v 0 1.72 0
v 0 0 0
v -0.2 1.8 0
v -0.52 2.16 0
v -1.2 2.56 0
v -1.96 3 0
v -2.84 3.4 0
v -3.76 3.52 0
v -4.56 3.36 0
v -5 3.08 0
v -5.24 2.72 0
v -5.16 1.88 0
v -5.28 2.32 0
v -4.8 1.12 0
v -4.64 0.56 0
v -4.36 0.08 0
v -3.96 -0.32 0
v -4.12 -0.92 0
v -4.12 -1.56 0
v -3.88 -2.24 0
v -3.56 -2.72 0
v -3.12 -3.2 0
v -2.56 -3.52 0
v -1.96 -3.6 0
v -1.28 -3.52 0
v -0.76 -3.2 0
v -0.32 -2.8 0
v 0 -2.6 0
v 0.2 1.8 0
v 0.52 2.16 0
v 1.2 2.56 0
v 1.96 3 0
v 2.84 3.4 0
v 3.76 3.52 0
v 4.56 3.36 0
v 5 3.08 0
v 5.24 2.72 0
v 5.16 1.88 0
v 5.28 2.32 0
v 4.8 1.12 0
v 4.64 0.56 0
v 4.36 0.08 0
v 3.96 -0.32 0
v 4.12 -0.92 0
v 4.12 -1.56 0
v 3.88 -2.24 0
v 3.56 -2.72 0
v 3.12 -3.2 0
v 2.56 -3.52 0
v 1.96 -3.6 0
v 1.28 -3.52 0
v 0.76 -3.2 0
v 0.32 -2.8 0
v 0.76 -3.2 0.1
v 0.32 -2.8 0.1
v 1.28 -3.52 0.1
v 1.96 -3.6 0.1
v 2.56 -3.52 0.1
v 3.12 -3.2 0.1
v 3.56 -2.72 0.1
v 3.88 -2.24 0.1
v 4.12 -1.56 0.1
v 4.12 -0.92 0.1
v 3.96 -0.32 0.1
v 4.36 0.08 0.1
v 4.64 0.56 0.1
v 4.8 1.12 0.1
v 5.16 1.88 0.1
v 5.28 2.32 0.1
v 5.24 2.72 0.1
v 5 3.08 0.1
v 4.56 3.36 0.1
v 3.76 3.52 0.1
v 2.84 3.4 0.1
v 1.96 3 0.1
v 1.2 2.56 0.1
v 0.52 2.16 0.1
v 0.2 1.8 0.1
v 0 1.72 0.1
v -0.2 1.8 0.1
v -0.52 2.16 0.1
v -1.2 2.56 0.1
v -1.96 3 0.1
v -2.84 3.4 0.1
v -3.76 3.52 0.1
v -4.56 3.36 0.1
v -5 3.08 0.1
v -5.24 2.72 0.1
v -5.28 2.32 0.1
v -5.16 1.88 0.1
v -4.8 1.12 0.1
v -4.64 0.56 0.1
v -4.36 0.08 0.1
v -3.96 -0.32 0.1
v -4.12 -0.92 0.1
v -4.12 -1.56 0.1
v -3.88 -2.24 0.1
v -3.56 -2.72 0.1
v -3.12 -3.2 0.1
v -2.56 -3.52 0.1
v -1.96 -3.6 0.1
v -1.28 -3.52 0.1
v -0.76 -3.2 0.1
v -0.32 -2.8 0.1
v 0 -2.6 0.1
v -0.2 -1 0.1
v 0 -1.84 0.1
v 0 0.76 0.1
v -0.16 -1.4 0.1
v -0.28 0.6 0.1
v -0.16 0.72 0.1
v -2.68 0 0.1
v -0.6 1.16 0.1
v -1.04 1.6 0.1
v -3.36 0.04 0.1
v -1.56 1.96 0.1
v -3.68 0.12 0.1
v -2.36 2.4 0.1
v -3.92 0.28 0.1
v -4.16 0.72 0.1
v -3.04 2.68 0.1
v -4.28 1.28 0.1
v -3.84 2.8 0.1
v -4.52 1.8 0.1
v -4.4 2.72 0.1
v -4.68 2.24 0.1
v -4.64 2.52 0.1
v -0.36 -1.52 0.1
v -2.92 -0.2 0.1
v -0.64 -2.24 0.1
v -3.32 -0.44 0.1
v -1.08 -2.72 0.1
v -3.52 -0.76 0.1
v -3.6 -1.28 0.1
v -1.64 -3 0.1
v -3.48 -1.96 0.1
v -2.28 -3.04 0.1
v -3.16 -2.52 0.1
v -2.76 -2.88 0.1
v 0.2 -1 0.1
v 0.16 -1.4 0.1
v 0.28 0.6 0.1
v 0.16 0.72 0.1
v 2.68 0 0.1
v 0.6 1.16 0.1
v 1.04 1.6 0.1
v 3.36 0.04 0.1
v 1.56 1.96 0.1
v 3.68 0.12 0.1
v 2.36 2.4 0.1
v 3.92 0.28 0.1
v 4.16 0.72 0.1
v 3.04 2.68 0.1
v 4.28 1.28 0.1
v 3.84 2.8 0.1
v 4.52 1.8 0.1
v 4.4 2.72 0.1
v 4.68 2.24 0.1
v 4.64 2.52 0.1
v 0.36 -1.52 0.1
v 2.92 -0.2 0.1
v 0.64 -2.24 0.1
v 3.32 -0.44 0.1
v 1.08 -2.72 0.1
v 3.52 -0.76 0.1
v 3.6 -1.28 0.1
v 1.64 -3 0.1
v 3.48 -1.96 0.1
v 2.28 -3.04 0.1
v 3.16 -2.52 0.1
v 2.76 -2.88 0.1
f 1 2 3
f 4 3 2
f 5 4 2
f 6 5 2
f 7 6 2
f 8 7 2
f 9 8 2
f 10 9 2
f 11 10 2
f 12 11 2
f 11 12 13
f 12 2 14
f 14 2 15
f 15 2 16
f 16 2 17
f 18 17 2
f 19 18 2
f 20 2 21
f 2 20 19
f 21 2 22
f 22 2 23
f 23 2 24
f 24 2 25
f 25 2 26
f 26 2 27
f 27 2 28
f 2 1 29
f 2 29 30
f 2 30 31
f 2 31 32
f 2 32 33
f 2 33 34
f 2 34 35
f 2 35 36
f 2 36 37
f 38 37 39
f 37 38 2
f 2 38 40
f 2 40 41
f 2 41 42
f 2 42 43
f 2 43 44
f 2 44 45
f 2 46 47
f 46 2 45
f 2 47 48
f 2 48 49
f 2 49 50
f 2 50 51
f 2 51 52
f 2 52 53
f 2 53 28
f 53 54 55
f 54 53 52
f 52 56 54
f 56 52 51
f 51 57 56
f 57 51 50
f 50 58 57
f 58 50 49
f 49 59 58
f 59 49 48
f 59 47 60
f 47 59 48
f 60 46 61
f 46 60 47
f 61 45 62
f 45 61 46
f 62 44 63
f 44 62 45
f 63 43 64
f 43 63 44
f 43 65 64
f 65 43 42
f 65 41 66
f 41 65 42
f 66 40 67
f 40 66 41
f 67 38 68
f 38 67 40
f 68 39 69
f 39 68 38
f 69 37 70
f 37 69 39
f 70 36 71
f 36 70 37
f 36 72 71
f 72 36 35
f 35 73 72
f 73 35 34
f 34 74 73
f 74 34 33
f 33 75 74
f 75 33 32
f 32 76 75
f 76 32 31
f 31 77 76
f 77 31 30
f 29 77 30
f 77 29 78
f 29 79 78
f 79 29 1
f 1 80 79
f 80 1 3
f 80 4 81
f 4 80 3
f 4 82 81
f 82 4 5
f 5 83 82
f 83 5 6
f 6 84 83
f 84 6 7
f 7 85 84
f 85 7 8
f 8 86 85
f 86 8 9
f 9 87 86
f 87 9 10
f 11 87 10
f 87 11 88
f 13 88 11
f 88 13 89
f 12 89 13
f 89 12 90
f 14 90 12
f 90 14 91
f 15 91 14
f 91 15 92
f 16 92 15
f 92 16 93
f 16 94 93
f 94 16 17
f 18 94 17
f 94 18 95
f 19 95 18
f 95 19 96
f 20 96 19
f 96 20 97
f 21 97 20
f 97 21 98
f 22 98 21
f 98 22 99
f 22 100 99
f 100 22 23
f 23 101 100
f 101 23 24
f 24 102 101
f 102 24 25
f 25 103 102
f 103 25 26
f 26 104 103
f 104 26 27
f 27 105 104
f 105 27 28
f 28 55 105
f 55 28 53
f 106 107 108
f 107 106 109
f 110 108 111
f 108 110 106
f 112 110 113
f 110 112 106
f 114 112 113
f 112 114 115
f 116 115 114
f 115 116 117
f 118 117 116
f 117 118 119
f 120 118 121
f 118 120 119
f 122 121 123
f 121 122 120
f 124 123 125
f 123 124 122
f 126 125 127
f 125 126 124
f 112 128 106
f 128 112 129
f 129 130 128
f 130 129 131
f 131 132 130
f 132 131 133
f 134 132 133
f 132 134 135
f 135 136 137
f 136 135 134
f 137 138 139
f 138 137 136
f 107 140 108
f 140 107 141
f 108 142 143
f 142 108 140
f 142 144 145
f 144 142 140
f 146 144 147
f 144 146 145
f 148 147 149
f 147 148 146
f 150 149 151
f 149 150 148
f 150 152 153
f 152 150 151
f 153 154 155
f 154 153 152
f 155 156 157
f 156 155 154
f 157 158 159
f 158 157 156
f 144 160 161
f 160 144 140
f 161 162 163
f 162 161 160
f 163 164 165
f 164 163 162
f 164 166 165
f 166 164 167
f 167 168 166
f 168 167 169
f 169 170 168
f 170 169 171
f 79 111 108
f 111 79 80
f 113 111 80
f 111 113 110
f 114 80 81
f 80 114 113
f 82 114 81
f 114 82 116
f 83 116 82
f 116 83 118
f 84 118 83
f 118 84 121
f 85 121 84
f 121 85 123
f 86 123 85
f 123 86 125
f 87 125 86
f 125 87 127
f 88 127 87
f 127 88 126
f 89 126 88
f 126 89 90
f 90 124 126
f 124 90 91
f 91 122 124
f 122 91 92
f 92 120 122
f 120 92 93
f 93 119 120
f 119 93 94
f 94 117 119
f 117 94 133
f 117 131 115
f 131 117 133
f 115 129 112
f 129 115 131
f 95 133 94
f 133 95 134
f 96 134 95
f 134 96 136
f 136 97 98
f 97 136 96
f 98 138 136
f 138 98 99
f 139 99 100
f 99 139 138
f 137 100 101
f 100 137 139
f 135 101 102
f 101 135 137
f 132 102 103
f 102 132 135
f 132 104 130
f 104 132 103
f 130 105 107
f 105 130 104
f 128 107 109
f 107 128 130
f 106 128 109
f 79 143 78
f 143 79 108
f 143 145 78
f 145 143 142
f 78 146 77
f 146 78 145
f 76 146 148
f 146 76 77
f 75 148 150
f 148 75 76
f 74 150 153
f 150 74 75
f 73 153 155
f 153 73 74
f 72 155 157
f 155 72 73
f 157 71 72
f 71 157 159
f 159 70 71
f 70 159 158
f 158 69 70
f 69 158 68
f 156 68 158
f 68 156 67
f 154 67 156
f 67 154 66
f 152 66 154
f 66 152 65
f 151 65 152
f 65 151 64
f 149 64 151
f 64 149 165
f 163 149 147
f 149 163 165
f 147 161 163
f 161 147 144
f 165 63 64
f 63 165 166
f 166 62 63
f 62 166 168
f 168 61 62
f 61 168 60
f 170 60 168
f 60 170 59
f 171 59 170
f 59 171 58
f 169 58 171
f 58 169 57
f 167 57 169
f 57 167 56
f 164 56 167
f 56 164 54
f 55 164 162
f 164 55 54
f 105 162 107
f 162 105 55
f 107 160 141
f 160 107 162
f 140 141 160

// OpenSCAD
// file: s/4650854is02.scad
use <../../lib.scad>
function ldraw_lib__s__4650854is02() = [
// 0 ~Sticker  0.9 x  1.3 with Butterfly - Shape
// 0 Name: s\4650854is02.dat
// 0 Author: Takeshi Takahashi [RainbowDolphin]
// 0 !LDRAW_ORG Subpart UPDATE 2024-04
// 0 !LICENSE Licensed under CC BY 4.0 : see CAreadme.txt
// 
// 0 BFC CERTIFY CCW
  [0,"BFC","CERTIFY"],
  [0,"BFC","CCW"],
// 
// 0 !HISTORY 2024-05-28 [OrionP] Official Update 2024-04
// 
// 
// 4 16 -.5 -.25 -2.5 -.4 -.25 -3.5 0 -.25 -4.6 0 -.25 1.9
  [4,16,-.5,-.25,-2.5,-.4,-.25,-3.5,0,-.25,-4.6,0,-.25,1.9],
// 4 16 -.5 -.25 -2.5 0 -.25 1.9 -.4 -.25 1.8 -.7 -.25 1.5
  [4,16,-.5,-.25,-2.5,0,-.25,1.9,-.4,-.25,1.8,-.7,-.25,1.5],
// 4 16 -6.7 -.25 0 -.5 -.25 -2.5 -.7 -.25 1.5 -1.5 -.25 2.9
  [4,16,-6.7,-.25,0,-.5,-.25,-2.5,-.7,-.25,1.5,-1.5,-.25,2.9],
// 4 16 -8.4 -.25 .1 -6.7 -.25 0 -1.5 -.25 2.9 -2.6 -.25 4
  [4,16,-8.4,-.25,.1,-6.7,-.25,0,-1.5,-.25,2.9,-2.6,-.25,4],
// 4 16 -9.2 -.25 .3 -8.4 -.25 .1 -2.6 -.25 4 -3.9 -.25 4.9
  [4,16,-9.2,-.25,.3,-8.4,-.25,.1,-2.6,-.25,4,-3.9,-.25,4.9],
// 4 16 -9.8 -.25 .7 -9.2 -.25 .3 -3.9 -.25 4.9 -5.9 -.25 6
  [4,16,-9.8,-.25,.7,-9.2,-.25,.3,-3.9,-.25,4.9,-5.9,-.25,6],
// 4 16 -10.4 -.25 1.8 -9.8 -.25 .7 -5.9 -.25 6 -7.6 -.25 6.7
  [4,16,-10.4,-.25,1.8,-9.8,-.25,.7,-5.9,-.25,6,-7.6,-.25,6.7],
// 4 16 -10.7 -.25 3.2 -10.4 -.25 1.8 -7.6 -.25 6.7 -9.6 -.25 7
  [4,16,-10.7,-.25,3.2,-10.4,-.25,1.8,-7.6,-.25,6.7,-9.6,-.25,7],
// 4 16 -11.3 -.25 4.5 -10.7 -.25 3.2 -9.6 -.25 7 -11 -.25 6.8
  [4,16,-11.3,-.25,4.5,-10.7,-.25,3.2,-9.6,-.25,7,-11,-.25,6.8],
// 4 16 -11.7 -.25 5.6 -11.3 -.25 4.5 -11 -.25 6.8 -11.6 -.25 6.3
  [4,16,-11.7,-.25,5.6,-11.3,-.25,4.5,-11,-.25,6.8,-11.6,-.25,6.3],
// 4 16 -.5 -.25 -2.5 -6.7 -.25 0 -7.3 -.25 -.5 -.9 -.25 -3.8
  [4,16,-.5,-.25,-2.5,-6.7,-.25,0,-7.3,-.25,-.5,-.9,-.25,-3.8],
// 4 16 -.9 -.25 -3.8 -7.3 -.25 -.5 -8.3 -.25 -1.1 -1.6 -.25 -5.6
  [4,16,-.9,-.25,-3.8,-7.3,-.25,-.5,-8.3,-.25,-1.1,-1.6,-.25,-5.6],
// 4 16 -1.6 -.25 -5.6 -8.3 -.25 -1.1 -8.8 -.25 -1.9 -2.7 -.25 -6.8
  [4,16,-1.6,-.25,-5.6,-8.3,-.25,-1.1,-8.8,-.25,-1.9,-2.7,-.25,-6.8],
// 4 16 -2.7 -.25 -6.8 -8.8 -.25 -1.9 -9 -.25 -3.2 -4.1 -.25 -7.5
  [4,16,-2.7,-.25,-6.8,-8.8,-.25,-1.9,-9,-.25,-3.2,-4.1,-.25,-7.5],
// 4 16 -4.1 -.25 -7.5 -9 -.25 -3.2 -8.7 -.25 -4.9 -5.7 -.25 -7.6
  [4,16,-4.1,-.25,-7.5,-9,-.25,-3.2,-8.7,-.25,-4.9,-5.7,-.25,-7.6],
// 4 16 -5.7 -.25 -7.6 -8.7 -.25 -4.9 -7.9 -.25 -6.3 -6.9 -.25 -7.2
  [4,16,-5.7,-.25,-7.6,-8.7,-.25,-4.9,-7.9,-.25,-6.3,-6.9,-.25,-7.2],
// 4 16 0 -.25 -4.6 .4 -.25 -3.5 .5 -.25 -2.5 0 -.25 1.9
  [4,16,0,-.25,-4.6,.4,-.25,-3.5,.5,-.25,-2.5,0,-.25,1.9],
// 4 16 .4 -.25 1.8 0 -.25 1.9 .5 -.25 -2.5 .7 -.25 1.5
  [4,16,.4,-.25,1.8,0,-.25,1.9,.5,-.25,-2.5,.7,-.25,1.5],
// 4 16 .7 -.25 1.5 .5 -.25 -2.5 6.7 -.25 0 1.5 -.25 2.9
  [4,16,.7,-.25,1.5,.5,-.25,-2.5,6.7,-.25,0,1.5,-.25,2.9],
// 4 16 1.5 -.25 2.9 6.7 -.25 0 8.4 -.25 .1 2.6 -.25 4
  [4,16,1.5,-.25,2.9,6.7,-.25,0,8.4,-.25,.1,2.6,-.25,4],
// 4 16 2.6 -.25 4 8.4 -.25 .1 9.2 -.25 .3 3.9 -.25 4.9
  [4,16,2.6,-.25,4,8.4,-.25,.1,9.2,-.25,.3,3.9,-.25,4.9],
// 4 16 3.9 -.25 4.9 9.2 -.25 .3 9.8 -.25 .7 5.9 -.25 6
  [4,16,3.9,-.25,4.9,9.2,-.25,.3,9.8,-.25,.7,5.9,-.25,6],
// 4 16 5.9 -.25 6 9.8 -.25 .7 10.4 -.25 1.8 7.6 -.25 6.7
  [4,16,5.9,-.25,6,9.8,-.25,.7,10.4,-.25,1.8,7.6,-.25,6.7],
// 4 16 7.6 -.25 6.7 10.4 -.25 1.8 10.7 -.25 3.2 9.6 -.25 7
  [4,16,7.6,-.25,6.7,10.4,-.25,1.8,10.7,-.25,3.2,9.6,-.25,7],
// 4 16 9.6 -.25 7 10.7 -.25 3.2 11.3 -.25 4.5 11 -.25 6.8
  [4,16,9.6,-.25,7,10.7,-.25,3.2,11.3,-.25,4.5,11,-.25,6.8],
// 4 16 11 -.25 6.8 11.3 -.25 4.5 11.7 -.25 5.6 11.6 -.25 6.3
  [4,16,11,-.25,6.8,11.3,-.25,4.5,11.7,-.25,5.6,11.6,-.25,6.3],
// 4 16 7.3 -.25 -.5 6.7 -.25 0 .5 -.25 -2.5 .9 -.25 -3.8
  [4,16,7.3,-.25,-.5,6.7,-.25,0,.5,-.25,-2.5,.9,-.25,-3.8],
// 4 16 8.3 -.25 -1.1 7.3 -.25 -.5 .9 -.25 -3.8 1.6 -.25 -5.6
  [4,16,8.3,-.25,-1.1,7.3,-.25,-.5,.9,-.25,-3.8,1.6,-.25,-5.6],
// 4 16 8.8 -.25 -1.9 8.3 -.25 -1.1 1.6 -.25 -5.6 2.7 -.25 -6.8
  [4,16,8.8,-.25,-1.9,8.3,-.25,-1.1,1.6,-.25,-5.6,2.7,-.25,-6.8],
// 4 16 9 -.25 -3.2 8.8 -.25 -1.9 2.7 -.25 -6.8 4.1 -.25 -7.5
  [4,16,9,-.25,-3.2,8.8,-.25,-1.9,2.7,-.25,-6.8,4.1,-.25,-7.5],
// 4 16 8.7 -.25 -4.9 9 -.25 -3.2 4.1 -.25 -7.5 5.7 -.25 -7.6
  [4,16,8.7,-.25,-4.9,9,-.25,-3.2,4.1,-.25,-7.5,5.7,-.25,-7.6],
// 4 16 7.9 -.25 -6.3 8.7 -.25 -4.9 5.7 -.25 -7.6 6.9 -.25 -7.2
  [4,16,7.9,-.25,-6.3,8.7,-.25,-4.9,5.7,-.25,-7.6,6.9,-.25,-7.2],
];
module ldraw_lib__s__4650854is02(step=0, col=false, unit=2/5, alt=false, line=0.2, solid=!$preview)
    makepoly(ldraw_lib__s__4650854is02(), step=step, col=col, unit=unit, alt=alt, line=line, solid=solid);
ldraw_lib__s__4650854is02(line=0.2);
// main file
use <../lib.scad>
use <s/4650854is01.scad>
use <s/4650854is02.scad>
use <s/4650854is03.scad>
function ldraw_lib__4620859i() = [
// 0 Sticker  0.9 x  1.3 with Medium Lavender Butterfly
// 0 Name: 4620859i.dat
// 0 Author: Takeshi Takahashi [RainbowDolphin]
// 0 !LDRAW_ORG Part UPDATE 2024-04
// 0 !LICENSE Licensed under CC BY 4.0 : see CAreadme.txt
// 
// 0 BFC CERTIFY CCW
  [0,"BFC","CERTIFY"],
  [0,"BFC","CCW"],
// 
// 0 !KEYWORDS Set 3189, Stable
// 
// 0 !HISTORY 2024-05-28 [OrionP] Official Update 2024-04
// 
// 
// 1 16 0 0 0 1 0 0 0 1 0 0 0 1 s\4650854is01.dat
  [1,16,0,0,0,1,0,0,0,1,0,0,0,1, ldraw_lib__s__4650854is01()],
// 1 30 0 0 0 1 0 0 0 1 0 0 0 1 s\4650854is02.dat
  [1,30,0,0,0,1,0,0,0,1,0,0,0,1, ldraw_lib__s__4650854is02()],
// 1 19 0 0 0 1 0 0 0 1 0 0 0 1 s\4650854is03.dat
  [1,19,0,0,0,1,0,0,0,1,0,0,0,1, ldraw_lib__s__4650854is03()],
];
module ldraw_lib__4620859i(step=0, col=false, unit=2/5, alt=false, line=0.2, solid=!$preview)
    makepoly(ldraw_lib__4620859i(), step=step, col=col, unit=unit, alt=alt, line=line, solid=solid);
ldraw_lib__4620859i(line=0.2);
